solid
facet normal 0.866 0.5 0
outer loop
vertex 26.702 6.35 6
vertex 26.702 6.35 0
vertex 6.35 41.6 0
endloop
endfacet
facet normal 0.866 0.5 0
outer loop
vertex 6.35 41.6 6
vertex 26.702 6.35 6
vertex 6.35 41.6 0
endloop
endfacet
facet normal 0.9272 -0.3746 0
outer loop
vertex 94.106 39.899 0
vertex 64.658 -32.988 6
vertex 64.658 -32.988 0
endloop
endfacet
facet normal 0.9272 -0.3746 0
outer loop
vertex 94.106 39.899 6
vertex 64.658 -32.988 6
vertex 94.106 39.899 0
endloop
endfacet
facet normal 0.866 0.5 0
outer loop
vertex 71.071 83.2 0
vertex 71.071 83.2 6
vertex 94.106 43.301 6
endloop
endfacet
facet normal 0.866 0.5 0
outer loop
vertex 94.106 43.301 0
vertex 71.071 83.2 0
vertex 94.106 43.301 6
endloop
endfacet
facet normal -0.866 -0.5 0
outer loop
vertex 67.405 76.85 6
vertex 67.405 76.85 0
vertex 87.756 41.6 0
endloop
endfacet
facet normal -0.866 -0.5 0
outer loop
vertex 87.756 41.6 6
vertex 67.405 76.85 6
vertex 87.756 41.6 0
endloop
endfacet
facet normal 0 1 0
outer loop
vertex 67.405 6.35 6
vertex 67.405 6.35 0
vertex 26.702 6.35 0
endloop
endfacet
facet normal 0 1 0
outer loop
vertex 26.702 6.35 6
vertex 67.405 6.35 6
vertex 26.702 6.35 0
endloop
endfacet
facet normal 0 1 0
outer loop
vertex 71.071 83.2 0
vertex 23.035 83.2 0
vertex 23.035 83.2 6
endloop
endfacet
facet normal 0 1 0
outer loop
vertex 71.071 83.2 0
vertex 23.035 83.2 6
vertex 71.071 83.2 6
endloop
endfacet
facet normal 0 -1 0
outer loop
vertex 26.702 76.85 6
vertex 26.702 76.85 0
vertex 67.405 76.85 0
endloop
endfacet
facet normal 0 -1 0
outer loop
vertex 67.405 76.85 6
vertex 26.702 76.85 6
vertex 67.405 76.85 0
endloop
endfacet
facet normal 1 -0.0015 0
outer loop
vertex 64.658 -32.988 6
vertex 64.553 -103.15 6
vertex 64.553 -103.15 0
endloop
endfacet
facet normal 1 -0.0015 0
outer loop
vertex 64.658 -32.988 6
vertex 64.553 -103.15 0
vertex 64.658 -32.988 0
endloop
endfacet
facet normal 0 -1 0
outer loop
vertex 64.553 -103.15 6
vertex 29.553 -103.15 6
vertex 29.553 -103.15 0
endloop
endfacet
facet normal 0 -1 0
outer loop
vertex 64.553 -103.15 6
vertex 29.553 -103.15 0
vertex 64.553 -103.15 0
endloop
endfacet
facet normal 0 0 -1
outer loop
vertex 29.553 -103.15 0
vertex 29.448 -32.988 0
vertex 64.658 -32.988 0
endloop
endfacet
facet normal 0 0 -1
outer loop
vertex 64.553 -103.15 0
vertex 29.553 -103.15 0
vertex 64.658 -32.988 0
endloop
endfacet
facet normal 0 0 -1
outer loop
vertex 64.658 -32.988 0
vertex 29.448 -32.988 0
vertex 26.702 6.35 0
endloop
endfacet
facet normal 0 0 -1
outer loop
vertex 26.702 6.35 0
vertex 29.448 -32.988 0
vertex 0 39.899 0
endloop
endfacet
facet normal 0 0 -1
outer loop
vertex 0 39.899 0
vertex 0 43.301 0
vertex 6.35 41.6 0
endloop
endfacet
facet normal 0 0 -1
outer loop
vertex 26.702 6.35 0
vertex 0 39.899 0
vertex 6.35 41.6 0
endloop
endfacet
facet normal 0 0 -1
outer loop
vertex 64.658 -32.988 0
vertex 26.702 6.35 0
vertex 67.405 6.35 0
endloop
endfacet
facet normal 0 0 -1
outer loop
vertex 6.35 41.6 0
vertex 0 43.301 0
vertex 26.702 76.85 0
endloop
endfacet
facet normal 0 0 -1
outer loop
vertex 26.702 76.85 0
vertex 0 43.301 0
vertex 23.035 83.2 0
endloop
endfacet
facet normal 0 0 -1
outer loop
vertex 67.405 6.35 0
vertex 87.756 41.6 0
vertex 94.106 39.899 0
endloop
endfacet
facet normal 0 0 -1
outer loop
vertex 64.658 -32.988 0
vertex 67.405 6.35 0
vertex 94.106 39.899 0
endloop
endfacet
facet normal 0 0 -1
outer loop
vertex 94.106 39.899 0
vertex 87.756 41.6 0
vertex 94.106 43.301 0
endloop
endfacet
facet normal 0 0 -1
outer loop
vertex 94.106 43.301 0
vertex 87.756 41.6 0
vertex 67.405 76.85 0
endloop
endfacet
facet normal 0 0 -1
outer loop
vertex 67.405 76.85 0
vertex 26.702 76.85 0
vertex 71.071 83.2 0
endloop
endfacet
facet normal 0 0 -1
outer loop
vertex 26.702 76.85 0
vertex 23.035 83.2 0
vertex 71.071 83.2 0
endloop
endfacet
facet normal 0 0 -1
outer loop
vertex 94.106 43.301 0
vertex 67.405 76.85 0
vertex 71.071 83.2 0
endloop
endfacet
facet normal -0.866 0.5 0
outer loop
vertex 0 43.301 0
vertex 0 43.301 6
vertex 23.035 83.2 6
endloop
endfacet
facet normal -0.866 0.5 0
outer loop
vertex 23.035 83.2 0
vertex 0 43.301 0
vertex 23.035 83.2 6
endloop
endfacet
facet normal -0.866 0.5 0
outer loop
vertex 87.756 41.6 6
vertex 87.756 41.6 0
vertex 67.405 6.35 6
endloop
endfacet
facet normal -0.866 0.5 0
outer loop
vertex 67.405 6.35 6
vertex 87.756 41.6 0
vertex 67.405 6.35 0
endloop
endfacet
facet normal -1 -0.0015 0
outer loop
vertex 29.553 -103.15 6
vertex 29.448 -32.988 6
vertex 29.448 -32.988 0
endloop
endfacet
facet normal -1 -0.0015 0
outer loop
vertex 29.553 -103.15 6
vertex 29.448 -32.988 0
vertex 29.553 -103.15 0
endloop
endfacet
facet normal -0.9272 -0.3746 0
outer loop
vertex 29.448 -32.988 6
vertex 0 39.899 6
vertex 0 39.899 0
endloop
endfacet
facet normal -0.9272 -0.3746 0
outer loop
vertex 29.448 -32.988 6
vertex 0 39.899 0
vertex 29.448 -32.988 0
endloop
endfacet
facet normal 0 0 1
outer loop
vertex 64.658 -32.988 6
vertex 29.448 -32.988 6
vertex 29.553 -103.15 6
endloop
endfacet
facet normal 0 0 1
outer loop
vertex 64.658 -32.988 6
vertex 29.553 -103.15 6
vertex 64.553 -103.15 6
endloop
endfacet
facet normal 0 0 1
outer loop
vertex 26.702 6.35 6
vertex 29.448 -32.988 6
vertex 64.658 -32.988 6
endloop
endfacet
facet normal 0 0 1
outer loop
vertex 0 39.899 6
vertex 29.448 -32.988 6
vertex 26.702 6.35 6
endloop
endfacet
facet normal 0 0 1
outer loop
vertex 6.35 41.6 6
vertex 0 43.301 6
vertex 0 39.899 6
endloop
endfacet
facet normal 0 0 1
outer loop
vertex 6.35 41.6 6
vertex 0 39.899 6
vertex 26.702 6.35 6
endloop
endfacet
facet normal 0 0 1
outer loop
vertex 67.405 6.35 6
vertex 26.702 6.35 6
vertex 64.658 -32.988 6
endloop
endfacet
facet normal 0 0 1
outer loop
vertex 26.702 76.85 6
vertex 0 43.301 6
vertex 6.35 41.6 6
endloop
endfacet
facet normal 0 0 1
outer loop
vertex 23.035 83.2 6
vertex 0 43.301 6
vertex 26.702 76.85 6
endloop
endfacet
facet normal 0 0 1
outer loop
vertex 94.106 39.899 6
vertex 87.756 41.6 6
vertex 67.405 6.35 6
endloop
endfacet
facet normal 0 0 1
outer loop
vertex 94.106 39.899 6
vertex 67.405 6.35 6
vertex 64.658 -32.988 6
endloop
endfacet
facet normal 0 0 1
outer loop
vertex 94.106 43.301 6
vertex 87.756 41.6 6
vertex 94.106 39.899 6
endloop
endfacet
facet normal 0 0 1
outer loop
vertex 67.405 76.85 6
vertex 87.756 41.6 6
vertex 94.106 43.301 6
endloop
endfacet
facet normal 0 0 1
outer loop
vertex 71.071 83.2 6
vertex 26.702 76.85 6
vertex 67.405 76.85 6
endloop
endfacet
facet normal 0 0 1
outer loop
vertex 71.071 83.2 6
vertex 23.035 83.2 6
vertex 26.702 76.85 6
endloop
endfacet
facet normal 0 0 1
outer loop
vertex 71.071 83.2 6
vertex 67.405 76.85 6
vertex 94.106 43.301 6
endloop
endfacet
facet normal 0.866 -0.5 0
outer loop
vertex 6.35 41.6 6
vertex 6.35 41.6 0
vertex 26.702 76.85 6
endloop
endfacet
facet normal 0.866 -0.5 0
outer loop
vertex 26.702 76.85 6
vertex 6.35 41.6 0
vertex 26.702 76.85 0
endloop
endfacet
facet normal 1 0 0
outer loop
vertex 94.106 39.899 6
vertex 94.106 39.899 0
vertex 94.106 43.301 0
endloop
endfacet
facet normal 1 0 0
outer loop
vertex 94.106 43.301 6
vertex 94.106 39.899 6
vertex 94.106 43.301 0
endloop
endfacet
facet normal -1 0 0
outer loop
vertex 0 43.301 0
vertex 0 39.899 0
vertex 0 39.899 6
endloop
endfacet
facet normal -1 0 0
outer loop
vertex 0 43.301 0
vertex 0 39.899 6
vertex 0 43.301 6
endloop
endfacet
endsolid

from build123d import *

# Parameters (mm, degrees)
F0_W     = 94.106388
F0_H     = 83.2
F1_DEPTH = 6
F3_DEPTH = 6.001
F5_DEPTH = 6


with BuildPart() as f1:
    # F0 (on Top) → F1 (new body)
    with BuildSketch(Plane.XY):
        with Locations((47.053194, 41.6)):
            Rectangle(F0_W, F0_H)
        Polygon((67.404791, 6.35), (26.701597, 6.35), (6.35, 41.6), (26.701597, 76.85), (67.404791, 76.85), (87.756388, 41.6), align=None, mode=Mode.SUBTRACT)
    extrude(amount=F1_DEPTH)

    # F2 (on face) → F3 (cut, through all)
    with BuildSketch(Plane.XY.offset(6)):
        Polygon((0, 83.2), (0, 43.301477), (23.035423, 83.2), align=None)
        Polygon((94.106388, 83.2), (71.070965, 83.2), (94.106388, 43.301477), align=None)
        Polygon((94.106388, 39.898523), (71.070965, 0), (94.106388, 0), align=None)
        Polygon((23.035423, 0), (0, 39.898523), (0, 0), align=None)
    extrude(amount=-F3_DEPTH, mode=Mode.SUBTRACT)

    # F4 (on face) → F5 (join)
    with BuildSketch(Plane.XY.offset(6)):
        Polygon((23.035423, 0), (0, 39.898523), (29.44789, -32.987564), (29.553194, -103.15), (64.553194, -103.15), (64.658498, -32.987564), (94.106388, 39.898523), (71.070965, 0), align=None)
    extrude(amount=-F5_DEPTH)


solid = f1.part
